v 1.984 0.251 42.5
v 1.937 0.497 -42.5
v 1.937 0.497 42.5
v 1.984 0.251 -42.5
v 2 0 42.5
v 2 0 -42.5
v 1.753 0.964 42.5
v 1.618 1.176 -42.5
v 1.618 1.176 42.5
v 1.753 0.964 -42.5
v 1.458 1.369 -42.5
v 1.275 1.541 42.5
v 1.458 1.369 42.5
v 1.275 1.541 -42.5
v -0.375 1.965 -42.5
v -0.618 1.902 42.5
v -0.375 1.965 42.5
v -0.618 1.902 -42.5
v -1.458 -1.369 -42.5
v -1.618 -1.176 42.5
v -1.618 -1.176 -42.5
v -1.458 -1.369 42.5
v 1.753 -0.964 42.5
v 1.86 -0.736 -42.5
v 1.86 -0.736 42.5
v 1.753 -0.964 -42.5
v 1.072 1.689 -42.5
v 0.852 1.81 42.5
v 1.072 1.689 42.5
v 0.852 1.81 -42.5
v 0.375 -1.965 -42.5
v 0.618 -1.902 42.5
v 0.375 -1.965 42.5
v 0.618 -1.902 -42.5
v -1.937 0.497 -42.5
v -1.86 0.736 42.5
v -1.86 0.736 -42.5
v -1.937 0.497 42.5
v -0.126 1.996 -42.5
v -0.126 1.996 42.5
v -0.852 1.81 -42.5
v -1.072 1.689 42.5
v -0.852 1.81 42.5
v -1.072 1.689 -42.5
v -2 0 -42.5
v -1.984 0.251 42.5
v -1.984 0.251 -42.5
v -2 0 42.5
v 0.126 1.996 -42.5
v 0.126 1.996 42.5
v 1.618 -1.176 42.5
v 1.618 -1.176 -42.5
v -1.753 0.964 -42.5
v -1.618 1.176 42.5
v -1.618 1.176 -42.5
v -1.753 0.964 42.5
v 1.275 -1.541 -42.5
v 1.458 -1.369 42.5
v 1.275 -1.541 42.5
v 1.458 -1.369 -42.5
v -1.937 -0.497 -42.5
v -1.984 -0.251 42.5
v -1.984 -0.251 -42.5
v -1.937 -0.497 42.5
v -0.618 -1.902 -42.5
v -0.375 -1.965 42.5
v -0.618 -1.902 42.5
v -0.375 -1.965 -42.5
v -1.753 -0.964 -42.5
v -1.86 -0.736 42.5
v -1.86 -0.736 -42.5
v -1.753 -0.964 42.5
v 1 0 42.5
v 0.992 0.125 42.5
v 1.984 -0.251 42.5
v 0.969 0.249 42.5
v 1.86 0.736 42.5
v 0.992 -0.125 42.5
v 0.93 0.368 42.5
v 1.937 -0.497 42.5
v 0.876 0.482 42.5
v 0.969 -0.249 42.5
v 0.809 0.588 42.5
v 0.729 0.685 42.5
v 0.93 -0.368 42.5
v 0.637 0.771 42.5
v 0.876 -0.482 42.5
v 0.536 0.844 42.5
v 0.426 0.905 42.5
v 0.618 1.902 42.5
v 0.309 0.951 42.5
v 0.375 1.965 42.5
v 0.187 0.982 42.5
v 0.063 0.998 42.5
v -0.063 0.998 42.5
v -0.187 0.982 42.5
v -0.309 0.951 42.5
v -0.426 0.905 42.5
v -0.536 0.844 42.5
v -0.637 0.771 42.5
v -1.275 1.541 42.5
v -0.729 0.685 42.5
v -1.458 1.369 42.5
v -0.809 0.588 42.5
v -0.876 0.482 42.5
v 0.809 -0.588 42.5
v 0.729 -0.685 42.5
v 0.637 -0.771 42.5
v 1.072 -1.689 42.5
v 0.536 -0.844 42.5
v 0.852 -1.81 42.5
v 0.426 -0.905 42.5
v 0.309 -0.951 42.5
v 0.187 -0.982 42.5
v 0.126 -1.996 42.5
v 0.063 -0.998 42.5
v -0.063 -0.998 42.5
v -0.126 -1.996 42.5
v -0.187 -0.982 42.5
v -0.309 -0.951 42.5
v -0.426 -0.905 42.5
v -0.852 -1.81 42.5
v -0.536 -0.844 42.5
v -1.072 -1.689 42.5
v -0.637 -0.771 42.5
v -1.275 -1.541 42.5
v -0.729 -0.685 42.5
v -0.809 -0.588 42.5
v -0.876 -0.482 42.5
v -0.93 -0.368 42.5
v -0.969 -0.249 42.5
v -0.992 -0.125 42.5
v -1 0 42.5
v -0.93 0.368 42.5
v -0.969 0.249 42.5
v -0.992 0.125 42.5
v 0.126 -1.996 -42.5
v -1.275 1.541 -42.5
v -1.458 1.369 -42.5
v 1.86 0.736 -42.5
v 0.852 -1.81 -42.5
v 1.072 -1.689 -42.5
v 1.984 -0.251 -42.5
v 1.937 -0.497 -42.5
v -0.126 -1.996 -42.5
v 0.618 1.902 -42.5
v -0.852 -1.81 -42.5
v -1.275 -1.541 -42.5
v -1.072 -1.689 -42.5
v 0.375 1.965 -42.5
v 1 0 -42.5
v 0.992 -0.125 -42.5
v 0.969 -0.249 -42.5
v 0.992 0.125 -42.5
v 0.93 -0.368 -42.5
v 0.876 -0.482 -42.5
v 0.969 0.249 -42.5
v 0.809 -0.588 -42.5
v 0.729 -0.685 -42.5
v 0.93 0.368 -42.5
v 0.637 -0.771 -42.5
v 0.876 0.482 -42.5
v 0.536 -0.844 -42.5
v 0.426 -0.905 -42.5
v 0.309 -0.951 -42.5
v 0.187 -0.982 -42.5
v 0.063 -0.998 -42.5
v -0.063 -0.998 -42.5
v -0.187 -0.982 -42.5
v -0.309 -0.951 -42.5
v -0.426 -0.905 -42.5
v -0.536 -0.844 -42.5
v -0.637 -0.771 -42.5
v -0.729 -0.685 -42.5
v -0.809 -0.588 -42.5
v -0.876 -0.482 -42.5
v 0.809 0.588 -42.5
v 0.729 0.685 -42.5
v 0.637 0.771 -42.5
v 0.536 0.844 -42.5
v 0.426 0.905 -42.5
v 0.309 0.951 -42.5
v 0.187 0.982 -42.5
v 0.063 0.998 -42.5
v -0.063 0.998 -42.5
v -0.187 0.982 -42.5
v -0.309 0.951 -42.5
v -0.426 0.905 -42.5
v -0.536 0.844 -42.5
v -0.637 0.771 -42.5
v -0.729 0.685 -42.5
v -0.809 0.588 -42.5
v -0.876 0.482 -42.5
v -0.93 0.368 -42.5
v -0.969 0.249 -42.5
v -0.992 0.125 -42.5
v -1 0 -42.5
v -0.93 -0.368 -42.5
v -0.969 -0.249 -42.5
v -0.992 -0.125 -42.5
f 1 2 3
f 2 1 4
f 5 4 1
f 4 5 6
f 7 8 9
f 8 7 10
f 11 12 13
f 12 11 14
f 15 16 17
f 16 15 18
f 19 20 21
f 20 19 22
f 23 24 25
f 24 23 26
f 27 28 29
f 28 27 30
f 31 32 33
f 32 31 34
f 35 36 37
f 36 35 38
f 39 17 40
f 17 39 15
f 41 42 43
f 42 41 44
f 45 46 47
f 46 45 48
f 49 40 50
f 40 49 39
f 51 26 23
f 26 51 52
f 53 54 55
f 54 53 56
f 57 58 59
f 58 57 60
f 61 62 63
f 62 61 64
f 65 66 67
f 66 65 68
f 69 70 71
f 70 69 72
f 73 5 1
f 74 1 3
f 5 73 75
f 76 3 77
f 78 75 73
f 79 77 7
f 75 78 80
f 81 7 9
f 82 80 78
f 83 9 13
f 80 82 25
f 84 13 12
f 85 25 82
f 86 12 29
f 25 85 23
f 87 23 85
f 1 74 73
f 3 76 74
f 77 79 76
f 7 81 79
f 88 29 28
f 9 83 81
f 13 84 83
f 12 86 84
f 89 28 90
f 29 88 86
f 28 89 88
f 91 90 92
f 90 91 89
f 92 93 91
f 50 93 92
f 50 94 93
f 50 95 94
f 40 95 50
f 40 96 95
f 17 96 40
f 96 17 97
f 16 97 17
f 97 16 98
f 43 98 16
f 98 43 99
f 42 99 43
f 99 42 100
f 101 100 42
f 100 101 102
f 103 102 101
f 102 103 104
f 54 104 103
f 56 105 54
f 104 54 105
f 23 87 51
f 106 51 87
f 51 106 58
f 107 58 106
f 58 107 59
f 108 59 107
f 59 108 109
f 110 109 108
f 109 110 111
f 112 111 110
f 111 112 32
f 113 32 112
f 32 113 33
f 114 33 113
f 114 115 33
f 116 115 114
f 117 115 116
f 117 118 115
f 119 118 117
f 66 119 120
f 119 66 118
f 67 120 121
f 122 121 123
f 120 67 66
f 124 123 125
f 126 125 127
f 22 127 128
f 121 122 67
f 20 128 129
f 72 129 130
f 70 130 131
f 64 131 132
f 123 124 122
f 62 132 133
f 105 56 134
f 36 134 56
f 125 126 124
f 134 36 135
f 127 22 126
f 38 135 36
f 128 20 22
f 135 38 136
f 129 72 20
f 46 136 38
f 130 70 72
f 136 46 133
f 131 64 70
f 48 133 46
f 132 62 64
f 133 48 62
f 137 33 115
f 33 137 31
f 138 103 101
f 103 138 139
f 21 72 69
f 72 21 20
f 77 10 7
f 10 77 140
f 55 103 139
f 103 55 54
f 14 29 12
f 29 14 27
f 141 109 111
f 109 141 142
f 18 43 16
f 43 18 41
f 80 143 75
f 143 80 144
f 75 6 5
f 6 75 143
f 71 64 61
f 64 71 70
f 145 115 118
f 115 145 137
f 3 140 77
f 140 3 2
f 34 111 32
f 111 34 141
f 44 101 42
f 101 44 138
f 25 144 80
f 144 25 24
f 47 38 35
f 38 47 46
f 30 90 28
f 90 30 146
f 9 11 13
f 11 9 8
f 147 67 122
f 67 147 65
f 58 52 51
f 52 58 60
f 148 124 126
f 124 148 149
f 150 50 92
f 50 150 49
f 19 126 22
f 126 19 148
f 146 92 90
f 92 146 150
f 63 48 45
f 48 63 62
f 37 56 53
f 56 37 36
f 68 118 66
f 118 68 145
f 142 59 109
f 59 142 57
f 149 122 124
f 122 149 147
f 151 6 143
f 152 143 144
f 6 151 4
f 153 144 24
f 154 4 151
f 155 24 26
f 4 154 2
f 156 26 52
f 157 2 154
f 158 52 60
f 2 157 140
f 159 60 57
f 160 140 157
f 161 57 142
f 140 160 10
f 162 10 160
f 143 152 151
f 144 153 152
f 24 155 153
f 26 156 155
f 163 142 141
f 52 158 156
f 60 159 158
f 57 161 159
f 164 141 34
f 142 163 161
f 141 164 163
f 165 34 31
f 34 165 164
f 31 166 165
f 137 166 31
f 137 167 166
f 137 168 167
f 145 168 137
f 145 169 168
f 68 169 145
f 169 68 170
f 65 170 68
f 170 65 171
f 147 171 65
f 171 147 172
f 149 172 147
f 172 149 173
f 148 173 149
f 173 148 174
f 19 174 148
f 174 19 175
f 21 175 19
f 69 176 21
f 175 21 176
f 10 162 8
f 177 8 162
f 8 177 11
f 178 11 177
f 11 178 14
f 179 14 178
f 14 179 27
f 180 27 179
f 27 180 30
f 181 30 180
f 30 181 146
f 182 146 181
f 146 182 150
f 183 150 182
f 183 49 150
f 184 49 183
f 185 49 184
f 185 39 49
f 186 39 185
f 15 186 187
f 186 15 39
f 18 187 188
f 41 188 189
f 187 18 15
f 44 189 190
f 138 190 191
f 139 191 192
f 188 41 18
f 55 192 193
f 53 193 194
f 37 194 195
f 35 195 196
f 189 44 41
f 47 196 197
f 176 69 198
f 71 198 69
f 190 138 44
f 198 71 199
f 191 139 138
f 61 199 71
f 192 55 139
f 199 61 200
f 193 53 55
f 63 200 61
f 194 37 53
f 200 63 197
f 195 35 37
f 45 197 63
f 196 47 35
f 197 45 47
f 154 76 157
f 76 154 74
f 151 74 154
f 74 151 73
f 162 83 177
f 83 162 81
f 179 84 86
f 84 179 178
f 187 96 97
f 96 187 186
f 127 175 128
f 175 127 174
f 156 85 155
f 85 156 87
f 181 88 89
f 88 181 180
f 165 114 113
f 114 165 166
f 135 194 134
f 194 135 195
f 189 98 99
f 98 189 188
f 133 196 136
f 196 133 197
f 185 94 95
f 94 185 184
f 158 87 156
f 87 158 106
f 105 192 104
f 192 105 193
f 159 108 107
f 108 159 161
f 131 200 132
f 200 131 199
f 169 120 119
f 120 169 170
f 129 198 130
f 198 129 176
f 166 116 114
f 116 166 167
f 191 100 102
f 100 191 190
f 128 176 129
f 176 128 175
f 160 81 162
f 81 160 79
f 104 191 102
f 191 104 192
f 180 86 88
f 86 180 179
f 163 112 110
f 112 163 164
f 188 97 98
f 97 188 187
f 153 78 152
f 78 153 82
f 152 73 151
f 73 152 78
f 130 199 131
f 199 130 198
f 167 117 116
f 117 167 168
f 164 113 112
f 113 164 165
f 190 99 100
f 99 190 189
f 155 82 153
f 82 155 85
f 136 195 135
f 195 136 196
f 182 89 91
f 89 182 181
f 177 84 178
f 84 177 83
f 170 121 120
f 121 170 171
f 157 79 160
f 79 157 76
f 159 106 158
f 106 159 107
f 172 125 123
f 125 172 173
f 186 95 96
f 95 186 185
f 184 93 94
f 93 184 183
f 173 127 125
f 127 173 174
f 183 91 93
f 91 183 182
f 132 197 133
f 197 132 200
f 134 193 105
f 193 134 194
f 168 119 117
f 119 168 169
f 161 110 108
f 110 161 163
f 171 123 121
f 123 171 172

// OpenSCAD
$fn = 50;


difference() {
	union() {
		translate(v = [0, 0, -42.5000000000]) {
			cylinder(h = 85, r = 2.0000000000);
		}
	}
	union() {
		translate(v = [0, 0, -100.0000000000]) {
			cylinder(h = 200, r = 1.0000000000);
		}
	}
}
